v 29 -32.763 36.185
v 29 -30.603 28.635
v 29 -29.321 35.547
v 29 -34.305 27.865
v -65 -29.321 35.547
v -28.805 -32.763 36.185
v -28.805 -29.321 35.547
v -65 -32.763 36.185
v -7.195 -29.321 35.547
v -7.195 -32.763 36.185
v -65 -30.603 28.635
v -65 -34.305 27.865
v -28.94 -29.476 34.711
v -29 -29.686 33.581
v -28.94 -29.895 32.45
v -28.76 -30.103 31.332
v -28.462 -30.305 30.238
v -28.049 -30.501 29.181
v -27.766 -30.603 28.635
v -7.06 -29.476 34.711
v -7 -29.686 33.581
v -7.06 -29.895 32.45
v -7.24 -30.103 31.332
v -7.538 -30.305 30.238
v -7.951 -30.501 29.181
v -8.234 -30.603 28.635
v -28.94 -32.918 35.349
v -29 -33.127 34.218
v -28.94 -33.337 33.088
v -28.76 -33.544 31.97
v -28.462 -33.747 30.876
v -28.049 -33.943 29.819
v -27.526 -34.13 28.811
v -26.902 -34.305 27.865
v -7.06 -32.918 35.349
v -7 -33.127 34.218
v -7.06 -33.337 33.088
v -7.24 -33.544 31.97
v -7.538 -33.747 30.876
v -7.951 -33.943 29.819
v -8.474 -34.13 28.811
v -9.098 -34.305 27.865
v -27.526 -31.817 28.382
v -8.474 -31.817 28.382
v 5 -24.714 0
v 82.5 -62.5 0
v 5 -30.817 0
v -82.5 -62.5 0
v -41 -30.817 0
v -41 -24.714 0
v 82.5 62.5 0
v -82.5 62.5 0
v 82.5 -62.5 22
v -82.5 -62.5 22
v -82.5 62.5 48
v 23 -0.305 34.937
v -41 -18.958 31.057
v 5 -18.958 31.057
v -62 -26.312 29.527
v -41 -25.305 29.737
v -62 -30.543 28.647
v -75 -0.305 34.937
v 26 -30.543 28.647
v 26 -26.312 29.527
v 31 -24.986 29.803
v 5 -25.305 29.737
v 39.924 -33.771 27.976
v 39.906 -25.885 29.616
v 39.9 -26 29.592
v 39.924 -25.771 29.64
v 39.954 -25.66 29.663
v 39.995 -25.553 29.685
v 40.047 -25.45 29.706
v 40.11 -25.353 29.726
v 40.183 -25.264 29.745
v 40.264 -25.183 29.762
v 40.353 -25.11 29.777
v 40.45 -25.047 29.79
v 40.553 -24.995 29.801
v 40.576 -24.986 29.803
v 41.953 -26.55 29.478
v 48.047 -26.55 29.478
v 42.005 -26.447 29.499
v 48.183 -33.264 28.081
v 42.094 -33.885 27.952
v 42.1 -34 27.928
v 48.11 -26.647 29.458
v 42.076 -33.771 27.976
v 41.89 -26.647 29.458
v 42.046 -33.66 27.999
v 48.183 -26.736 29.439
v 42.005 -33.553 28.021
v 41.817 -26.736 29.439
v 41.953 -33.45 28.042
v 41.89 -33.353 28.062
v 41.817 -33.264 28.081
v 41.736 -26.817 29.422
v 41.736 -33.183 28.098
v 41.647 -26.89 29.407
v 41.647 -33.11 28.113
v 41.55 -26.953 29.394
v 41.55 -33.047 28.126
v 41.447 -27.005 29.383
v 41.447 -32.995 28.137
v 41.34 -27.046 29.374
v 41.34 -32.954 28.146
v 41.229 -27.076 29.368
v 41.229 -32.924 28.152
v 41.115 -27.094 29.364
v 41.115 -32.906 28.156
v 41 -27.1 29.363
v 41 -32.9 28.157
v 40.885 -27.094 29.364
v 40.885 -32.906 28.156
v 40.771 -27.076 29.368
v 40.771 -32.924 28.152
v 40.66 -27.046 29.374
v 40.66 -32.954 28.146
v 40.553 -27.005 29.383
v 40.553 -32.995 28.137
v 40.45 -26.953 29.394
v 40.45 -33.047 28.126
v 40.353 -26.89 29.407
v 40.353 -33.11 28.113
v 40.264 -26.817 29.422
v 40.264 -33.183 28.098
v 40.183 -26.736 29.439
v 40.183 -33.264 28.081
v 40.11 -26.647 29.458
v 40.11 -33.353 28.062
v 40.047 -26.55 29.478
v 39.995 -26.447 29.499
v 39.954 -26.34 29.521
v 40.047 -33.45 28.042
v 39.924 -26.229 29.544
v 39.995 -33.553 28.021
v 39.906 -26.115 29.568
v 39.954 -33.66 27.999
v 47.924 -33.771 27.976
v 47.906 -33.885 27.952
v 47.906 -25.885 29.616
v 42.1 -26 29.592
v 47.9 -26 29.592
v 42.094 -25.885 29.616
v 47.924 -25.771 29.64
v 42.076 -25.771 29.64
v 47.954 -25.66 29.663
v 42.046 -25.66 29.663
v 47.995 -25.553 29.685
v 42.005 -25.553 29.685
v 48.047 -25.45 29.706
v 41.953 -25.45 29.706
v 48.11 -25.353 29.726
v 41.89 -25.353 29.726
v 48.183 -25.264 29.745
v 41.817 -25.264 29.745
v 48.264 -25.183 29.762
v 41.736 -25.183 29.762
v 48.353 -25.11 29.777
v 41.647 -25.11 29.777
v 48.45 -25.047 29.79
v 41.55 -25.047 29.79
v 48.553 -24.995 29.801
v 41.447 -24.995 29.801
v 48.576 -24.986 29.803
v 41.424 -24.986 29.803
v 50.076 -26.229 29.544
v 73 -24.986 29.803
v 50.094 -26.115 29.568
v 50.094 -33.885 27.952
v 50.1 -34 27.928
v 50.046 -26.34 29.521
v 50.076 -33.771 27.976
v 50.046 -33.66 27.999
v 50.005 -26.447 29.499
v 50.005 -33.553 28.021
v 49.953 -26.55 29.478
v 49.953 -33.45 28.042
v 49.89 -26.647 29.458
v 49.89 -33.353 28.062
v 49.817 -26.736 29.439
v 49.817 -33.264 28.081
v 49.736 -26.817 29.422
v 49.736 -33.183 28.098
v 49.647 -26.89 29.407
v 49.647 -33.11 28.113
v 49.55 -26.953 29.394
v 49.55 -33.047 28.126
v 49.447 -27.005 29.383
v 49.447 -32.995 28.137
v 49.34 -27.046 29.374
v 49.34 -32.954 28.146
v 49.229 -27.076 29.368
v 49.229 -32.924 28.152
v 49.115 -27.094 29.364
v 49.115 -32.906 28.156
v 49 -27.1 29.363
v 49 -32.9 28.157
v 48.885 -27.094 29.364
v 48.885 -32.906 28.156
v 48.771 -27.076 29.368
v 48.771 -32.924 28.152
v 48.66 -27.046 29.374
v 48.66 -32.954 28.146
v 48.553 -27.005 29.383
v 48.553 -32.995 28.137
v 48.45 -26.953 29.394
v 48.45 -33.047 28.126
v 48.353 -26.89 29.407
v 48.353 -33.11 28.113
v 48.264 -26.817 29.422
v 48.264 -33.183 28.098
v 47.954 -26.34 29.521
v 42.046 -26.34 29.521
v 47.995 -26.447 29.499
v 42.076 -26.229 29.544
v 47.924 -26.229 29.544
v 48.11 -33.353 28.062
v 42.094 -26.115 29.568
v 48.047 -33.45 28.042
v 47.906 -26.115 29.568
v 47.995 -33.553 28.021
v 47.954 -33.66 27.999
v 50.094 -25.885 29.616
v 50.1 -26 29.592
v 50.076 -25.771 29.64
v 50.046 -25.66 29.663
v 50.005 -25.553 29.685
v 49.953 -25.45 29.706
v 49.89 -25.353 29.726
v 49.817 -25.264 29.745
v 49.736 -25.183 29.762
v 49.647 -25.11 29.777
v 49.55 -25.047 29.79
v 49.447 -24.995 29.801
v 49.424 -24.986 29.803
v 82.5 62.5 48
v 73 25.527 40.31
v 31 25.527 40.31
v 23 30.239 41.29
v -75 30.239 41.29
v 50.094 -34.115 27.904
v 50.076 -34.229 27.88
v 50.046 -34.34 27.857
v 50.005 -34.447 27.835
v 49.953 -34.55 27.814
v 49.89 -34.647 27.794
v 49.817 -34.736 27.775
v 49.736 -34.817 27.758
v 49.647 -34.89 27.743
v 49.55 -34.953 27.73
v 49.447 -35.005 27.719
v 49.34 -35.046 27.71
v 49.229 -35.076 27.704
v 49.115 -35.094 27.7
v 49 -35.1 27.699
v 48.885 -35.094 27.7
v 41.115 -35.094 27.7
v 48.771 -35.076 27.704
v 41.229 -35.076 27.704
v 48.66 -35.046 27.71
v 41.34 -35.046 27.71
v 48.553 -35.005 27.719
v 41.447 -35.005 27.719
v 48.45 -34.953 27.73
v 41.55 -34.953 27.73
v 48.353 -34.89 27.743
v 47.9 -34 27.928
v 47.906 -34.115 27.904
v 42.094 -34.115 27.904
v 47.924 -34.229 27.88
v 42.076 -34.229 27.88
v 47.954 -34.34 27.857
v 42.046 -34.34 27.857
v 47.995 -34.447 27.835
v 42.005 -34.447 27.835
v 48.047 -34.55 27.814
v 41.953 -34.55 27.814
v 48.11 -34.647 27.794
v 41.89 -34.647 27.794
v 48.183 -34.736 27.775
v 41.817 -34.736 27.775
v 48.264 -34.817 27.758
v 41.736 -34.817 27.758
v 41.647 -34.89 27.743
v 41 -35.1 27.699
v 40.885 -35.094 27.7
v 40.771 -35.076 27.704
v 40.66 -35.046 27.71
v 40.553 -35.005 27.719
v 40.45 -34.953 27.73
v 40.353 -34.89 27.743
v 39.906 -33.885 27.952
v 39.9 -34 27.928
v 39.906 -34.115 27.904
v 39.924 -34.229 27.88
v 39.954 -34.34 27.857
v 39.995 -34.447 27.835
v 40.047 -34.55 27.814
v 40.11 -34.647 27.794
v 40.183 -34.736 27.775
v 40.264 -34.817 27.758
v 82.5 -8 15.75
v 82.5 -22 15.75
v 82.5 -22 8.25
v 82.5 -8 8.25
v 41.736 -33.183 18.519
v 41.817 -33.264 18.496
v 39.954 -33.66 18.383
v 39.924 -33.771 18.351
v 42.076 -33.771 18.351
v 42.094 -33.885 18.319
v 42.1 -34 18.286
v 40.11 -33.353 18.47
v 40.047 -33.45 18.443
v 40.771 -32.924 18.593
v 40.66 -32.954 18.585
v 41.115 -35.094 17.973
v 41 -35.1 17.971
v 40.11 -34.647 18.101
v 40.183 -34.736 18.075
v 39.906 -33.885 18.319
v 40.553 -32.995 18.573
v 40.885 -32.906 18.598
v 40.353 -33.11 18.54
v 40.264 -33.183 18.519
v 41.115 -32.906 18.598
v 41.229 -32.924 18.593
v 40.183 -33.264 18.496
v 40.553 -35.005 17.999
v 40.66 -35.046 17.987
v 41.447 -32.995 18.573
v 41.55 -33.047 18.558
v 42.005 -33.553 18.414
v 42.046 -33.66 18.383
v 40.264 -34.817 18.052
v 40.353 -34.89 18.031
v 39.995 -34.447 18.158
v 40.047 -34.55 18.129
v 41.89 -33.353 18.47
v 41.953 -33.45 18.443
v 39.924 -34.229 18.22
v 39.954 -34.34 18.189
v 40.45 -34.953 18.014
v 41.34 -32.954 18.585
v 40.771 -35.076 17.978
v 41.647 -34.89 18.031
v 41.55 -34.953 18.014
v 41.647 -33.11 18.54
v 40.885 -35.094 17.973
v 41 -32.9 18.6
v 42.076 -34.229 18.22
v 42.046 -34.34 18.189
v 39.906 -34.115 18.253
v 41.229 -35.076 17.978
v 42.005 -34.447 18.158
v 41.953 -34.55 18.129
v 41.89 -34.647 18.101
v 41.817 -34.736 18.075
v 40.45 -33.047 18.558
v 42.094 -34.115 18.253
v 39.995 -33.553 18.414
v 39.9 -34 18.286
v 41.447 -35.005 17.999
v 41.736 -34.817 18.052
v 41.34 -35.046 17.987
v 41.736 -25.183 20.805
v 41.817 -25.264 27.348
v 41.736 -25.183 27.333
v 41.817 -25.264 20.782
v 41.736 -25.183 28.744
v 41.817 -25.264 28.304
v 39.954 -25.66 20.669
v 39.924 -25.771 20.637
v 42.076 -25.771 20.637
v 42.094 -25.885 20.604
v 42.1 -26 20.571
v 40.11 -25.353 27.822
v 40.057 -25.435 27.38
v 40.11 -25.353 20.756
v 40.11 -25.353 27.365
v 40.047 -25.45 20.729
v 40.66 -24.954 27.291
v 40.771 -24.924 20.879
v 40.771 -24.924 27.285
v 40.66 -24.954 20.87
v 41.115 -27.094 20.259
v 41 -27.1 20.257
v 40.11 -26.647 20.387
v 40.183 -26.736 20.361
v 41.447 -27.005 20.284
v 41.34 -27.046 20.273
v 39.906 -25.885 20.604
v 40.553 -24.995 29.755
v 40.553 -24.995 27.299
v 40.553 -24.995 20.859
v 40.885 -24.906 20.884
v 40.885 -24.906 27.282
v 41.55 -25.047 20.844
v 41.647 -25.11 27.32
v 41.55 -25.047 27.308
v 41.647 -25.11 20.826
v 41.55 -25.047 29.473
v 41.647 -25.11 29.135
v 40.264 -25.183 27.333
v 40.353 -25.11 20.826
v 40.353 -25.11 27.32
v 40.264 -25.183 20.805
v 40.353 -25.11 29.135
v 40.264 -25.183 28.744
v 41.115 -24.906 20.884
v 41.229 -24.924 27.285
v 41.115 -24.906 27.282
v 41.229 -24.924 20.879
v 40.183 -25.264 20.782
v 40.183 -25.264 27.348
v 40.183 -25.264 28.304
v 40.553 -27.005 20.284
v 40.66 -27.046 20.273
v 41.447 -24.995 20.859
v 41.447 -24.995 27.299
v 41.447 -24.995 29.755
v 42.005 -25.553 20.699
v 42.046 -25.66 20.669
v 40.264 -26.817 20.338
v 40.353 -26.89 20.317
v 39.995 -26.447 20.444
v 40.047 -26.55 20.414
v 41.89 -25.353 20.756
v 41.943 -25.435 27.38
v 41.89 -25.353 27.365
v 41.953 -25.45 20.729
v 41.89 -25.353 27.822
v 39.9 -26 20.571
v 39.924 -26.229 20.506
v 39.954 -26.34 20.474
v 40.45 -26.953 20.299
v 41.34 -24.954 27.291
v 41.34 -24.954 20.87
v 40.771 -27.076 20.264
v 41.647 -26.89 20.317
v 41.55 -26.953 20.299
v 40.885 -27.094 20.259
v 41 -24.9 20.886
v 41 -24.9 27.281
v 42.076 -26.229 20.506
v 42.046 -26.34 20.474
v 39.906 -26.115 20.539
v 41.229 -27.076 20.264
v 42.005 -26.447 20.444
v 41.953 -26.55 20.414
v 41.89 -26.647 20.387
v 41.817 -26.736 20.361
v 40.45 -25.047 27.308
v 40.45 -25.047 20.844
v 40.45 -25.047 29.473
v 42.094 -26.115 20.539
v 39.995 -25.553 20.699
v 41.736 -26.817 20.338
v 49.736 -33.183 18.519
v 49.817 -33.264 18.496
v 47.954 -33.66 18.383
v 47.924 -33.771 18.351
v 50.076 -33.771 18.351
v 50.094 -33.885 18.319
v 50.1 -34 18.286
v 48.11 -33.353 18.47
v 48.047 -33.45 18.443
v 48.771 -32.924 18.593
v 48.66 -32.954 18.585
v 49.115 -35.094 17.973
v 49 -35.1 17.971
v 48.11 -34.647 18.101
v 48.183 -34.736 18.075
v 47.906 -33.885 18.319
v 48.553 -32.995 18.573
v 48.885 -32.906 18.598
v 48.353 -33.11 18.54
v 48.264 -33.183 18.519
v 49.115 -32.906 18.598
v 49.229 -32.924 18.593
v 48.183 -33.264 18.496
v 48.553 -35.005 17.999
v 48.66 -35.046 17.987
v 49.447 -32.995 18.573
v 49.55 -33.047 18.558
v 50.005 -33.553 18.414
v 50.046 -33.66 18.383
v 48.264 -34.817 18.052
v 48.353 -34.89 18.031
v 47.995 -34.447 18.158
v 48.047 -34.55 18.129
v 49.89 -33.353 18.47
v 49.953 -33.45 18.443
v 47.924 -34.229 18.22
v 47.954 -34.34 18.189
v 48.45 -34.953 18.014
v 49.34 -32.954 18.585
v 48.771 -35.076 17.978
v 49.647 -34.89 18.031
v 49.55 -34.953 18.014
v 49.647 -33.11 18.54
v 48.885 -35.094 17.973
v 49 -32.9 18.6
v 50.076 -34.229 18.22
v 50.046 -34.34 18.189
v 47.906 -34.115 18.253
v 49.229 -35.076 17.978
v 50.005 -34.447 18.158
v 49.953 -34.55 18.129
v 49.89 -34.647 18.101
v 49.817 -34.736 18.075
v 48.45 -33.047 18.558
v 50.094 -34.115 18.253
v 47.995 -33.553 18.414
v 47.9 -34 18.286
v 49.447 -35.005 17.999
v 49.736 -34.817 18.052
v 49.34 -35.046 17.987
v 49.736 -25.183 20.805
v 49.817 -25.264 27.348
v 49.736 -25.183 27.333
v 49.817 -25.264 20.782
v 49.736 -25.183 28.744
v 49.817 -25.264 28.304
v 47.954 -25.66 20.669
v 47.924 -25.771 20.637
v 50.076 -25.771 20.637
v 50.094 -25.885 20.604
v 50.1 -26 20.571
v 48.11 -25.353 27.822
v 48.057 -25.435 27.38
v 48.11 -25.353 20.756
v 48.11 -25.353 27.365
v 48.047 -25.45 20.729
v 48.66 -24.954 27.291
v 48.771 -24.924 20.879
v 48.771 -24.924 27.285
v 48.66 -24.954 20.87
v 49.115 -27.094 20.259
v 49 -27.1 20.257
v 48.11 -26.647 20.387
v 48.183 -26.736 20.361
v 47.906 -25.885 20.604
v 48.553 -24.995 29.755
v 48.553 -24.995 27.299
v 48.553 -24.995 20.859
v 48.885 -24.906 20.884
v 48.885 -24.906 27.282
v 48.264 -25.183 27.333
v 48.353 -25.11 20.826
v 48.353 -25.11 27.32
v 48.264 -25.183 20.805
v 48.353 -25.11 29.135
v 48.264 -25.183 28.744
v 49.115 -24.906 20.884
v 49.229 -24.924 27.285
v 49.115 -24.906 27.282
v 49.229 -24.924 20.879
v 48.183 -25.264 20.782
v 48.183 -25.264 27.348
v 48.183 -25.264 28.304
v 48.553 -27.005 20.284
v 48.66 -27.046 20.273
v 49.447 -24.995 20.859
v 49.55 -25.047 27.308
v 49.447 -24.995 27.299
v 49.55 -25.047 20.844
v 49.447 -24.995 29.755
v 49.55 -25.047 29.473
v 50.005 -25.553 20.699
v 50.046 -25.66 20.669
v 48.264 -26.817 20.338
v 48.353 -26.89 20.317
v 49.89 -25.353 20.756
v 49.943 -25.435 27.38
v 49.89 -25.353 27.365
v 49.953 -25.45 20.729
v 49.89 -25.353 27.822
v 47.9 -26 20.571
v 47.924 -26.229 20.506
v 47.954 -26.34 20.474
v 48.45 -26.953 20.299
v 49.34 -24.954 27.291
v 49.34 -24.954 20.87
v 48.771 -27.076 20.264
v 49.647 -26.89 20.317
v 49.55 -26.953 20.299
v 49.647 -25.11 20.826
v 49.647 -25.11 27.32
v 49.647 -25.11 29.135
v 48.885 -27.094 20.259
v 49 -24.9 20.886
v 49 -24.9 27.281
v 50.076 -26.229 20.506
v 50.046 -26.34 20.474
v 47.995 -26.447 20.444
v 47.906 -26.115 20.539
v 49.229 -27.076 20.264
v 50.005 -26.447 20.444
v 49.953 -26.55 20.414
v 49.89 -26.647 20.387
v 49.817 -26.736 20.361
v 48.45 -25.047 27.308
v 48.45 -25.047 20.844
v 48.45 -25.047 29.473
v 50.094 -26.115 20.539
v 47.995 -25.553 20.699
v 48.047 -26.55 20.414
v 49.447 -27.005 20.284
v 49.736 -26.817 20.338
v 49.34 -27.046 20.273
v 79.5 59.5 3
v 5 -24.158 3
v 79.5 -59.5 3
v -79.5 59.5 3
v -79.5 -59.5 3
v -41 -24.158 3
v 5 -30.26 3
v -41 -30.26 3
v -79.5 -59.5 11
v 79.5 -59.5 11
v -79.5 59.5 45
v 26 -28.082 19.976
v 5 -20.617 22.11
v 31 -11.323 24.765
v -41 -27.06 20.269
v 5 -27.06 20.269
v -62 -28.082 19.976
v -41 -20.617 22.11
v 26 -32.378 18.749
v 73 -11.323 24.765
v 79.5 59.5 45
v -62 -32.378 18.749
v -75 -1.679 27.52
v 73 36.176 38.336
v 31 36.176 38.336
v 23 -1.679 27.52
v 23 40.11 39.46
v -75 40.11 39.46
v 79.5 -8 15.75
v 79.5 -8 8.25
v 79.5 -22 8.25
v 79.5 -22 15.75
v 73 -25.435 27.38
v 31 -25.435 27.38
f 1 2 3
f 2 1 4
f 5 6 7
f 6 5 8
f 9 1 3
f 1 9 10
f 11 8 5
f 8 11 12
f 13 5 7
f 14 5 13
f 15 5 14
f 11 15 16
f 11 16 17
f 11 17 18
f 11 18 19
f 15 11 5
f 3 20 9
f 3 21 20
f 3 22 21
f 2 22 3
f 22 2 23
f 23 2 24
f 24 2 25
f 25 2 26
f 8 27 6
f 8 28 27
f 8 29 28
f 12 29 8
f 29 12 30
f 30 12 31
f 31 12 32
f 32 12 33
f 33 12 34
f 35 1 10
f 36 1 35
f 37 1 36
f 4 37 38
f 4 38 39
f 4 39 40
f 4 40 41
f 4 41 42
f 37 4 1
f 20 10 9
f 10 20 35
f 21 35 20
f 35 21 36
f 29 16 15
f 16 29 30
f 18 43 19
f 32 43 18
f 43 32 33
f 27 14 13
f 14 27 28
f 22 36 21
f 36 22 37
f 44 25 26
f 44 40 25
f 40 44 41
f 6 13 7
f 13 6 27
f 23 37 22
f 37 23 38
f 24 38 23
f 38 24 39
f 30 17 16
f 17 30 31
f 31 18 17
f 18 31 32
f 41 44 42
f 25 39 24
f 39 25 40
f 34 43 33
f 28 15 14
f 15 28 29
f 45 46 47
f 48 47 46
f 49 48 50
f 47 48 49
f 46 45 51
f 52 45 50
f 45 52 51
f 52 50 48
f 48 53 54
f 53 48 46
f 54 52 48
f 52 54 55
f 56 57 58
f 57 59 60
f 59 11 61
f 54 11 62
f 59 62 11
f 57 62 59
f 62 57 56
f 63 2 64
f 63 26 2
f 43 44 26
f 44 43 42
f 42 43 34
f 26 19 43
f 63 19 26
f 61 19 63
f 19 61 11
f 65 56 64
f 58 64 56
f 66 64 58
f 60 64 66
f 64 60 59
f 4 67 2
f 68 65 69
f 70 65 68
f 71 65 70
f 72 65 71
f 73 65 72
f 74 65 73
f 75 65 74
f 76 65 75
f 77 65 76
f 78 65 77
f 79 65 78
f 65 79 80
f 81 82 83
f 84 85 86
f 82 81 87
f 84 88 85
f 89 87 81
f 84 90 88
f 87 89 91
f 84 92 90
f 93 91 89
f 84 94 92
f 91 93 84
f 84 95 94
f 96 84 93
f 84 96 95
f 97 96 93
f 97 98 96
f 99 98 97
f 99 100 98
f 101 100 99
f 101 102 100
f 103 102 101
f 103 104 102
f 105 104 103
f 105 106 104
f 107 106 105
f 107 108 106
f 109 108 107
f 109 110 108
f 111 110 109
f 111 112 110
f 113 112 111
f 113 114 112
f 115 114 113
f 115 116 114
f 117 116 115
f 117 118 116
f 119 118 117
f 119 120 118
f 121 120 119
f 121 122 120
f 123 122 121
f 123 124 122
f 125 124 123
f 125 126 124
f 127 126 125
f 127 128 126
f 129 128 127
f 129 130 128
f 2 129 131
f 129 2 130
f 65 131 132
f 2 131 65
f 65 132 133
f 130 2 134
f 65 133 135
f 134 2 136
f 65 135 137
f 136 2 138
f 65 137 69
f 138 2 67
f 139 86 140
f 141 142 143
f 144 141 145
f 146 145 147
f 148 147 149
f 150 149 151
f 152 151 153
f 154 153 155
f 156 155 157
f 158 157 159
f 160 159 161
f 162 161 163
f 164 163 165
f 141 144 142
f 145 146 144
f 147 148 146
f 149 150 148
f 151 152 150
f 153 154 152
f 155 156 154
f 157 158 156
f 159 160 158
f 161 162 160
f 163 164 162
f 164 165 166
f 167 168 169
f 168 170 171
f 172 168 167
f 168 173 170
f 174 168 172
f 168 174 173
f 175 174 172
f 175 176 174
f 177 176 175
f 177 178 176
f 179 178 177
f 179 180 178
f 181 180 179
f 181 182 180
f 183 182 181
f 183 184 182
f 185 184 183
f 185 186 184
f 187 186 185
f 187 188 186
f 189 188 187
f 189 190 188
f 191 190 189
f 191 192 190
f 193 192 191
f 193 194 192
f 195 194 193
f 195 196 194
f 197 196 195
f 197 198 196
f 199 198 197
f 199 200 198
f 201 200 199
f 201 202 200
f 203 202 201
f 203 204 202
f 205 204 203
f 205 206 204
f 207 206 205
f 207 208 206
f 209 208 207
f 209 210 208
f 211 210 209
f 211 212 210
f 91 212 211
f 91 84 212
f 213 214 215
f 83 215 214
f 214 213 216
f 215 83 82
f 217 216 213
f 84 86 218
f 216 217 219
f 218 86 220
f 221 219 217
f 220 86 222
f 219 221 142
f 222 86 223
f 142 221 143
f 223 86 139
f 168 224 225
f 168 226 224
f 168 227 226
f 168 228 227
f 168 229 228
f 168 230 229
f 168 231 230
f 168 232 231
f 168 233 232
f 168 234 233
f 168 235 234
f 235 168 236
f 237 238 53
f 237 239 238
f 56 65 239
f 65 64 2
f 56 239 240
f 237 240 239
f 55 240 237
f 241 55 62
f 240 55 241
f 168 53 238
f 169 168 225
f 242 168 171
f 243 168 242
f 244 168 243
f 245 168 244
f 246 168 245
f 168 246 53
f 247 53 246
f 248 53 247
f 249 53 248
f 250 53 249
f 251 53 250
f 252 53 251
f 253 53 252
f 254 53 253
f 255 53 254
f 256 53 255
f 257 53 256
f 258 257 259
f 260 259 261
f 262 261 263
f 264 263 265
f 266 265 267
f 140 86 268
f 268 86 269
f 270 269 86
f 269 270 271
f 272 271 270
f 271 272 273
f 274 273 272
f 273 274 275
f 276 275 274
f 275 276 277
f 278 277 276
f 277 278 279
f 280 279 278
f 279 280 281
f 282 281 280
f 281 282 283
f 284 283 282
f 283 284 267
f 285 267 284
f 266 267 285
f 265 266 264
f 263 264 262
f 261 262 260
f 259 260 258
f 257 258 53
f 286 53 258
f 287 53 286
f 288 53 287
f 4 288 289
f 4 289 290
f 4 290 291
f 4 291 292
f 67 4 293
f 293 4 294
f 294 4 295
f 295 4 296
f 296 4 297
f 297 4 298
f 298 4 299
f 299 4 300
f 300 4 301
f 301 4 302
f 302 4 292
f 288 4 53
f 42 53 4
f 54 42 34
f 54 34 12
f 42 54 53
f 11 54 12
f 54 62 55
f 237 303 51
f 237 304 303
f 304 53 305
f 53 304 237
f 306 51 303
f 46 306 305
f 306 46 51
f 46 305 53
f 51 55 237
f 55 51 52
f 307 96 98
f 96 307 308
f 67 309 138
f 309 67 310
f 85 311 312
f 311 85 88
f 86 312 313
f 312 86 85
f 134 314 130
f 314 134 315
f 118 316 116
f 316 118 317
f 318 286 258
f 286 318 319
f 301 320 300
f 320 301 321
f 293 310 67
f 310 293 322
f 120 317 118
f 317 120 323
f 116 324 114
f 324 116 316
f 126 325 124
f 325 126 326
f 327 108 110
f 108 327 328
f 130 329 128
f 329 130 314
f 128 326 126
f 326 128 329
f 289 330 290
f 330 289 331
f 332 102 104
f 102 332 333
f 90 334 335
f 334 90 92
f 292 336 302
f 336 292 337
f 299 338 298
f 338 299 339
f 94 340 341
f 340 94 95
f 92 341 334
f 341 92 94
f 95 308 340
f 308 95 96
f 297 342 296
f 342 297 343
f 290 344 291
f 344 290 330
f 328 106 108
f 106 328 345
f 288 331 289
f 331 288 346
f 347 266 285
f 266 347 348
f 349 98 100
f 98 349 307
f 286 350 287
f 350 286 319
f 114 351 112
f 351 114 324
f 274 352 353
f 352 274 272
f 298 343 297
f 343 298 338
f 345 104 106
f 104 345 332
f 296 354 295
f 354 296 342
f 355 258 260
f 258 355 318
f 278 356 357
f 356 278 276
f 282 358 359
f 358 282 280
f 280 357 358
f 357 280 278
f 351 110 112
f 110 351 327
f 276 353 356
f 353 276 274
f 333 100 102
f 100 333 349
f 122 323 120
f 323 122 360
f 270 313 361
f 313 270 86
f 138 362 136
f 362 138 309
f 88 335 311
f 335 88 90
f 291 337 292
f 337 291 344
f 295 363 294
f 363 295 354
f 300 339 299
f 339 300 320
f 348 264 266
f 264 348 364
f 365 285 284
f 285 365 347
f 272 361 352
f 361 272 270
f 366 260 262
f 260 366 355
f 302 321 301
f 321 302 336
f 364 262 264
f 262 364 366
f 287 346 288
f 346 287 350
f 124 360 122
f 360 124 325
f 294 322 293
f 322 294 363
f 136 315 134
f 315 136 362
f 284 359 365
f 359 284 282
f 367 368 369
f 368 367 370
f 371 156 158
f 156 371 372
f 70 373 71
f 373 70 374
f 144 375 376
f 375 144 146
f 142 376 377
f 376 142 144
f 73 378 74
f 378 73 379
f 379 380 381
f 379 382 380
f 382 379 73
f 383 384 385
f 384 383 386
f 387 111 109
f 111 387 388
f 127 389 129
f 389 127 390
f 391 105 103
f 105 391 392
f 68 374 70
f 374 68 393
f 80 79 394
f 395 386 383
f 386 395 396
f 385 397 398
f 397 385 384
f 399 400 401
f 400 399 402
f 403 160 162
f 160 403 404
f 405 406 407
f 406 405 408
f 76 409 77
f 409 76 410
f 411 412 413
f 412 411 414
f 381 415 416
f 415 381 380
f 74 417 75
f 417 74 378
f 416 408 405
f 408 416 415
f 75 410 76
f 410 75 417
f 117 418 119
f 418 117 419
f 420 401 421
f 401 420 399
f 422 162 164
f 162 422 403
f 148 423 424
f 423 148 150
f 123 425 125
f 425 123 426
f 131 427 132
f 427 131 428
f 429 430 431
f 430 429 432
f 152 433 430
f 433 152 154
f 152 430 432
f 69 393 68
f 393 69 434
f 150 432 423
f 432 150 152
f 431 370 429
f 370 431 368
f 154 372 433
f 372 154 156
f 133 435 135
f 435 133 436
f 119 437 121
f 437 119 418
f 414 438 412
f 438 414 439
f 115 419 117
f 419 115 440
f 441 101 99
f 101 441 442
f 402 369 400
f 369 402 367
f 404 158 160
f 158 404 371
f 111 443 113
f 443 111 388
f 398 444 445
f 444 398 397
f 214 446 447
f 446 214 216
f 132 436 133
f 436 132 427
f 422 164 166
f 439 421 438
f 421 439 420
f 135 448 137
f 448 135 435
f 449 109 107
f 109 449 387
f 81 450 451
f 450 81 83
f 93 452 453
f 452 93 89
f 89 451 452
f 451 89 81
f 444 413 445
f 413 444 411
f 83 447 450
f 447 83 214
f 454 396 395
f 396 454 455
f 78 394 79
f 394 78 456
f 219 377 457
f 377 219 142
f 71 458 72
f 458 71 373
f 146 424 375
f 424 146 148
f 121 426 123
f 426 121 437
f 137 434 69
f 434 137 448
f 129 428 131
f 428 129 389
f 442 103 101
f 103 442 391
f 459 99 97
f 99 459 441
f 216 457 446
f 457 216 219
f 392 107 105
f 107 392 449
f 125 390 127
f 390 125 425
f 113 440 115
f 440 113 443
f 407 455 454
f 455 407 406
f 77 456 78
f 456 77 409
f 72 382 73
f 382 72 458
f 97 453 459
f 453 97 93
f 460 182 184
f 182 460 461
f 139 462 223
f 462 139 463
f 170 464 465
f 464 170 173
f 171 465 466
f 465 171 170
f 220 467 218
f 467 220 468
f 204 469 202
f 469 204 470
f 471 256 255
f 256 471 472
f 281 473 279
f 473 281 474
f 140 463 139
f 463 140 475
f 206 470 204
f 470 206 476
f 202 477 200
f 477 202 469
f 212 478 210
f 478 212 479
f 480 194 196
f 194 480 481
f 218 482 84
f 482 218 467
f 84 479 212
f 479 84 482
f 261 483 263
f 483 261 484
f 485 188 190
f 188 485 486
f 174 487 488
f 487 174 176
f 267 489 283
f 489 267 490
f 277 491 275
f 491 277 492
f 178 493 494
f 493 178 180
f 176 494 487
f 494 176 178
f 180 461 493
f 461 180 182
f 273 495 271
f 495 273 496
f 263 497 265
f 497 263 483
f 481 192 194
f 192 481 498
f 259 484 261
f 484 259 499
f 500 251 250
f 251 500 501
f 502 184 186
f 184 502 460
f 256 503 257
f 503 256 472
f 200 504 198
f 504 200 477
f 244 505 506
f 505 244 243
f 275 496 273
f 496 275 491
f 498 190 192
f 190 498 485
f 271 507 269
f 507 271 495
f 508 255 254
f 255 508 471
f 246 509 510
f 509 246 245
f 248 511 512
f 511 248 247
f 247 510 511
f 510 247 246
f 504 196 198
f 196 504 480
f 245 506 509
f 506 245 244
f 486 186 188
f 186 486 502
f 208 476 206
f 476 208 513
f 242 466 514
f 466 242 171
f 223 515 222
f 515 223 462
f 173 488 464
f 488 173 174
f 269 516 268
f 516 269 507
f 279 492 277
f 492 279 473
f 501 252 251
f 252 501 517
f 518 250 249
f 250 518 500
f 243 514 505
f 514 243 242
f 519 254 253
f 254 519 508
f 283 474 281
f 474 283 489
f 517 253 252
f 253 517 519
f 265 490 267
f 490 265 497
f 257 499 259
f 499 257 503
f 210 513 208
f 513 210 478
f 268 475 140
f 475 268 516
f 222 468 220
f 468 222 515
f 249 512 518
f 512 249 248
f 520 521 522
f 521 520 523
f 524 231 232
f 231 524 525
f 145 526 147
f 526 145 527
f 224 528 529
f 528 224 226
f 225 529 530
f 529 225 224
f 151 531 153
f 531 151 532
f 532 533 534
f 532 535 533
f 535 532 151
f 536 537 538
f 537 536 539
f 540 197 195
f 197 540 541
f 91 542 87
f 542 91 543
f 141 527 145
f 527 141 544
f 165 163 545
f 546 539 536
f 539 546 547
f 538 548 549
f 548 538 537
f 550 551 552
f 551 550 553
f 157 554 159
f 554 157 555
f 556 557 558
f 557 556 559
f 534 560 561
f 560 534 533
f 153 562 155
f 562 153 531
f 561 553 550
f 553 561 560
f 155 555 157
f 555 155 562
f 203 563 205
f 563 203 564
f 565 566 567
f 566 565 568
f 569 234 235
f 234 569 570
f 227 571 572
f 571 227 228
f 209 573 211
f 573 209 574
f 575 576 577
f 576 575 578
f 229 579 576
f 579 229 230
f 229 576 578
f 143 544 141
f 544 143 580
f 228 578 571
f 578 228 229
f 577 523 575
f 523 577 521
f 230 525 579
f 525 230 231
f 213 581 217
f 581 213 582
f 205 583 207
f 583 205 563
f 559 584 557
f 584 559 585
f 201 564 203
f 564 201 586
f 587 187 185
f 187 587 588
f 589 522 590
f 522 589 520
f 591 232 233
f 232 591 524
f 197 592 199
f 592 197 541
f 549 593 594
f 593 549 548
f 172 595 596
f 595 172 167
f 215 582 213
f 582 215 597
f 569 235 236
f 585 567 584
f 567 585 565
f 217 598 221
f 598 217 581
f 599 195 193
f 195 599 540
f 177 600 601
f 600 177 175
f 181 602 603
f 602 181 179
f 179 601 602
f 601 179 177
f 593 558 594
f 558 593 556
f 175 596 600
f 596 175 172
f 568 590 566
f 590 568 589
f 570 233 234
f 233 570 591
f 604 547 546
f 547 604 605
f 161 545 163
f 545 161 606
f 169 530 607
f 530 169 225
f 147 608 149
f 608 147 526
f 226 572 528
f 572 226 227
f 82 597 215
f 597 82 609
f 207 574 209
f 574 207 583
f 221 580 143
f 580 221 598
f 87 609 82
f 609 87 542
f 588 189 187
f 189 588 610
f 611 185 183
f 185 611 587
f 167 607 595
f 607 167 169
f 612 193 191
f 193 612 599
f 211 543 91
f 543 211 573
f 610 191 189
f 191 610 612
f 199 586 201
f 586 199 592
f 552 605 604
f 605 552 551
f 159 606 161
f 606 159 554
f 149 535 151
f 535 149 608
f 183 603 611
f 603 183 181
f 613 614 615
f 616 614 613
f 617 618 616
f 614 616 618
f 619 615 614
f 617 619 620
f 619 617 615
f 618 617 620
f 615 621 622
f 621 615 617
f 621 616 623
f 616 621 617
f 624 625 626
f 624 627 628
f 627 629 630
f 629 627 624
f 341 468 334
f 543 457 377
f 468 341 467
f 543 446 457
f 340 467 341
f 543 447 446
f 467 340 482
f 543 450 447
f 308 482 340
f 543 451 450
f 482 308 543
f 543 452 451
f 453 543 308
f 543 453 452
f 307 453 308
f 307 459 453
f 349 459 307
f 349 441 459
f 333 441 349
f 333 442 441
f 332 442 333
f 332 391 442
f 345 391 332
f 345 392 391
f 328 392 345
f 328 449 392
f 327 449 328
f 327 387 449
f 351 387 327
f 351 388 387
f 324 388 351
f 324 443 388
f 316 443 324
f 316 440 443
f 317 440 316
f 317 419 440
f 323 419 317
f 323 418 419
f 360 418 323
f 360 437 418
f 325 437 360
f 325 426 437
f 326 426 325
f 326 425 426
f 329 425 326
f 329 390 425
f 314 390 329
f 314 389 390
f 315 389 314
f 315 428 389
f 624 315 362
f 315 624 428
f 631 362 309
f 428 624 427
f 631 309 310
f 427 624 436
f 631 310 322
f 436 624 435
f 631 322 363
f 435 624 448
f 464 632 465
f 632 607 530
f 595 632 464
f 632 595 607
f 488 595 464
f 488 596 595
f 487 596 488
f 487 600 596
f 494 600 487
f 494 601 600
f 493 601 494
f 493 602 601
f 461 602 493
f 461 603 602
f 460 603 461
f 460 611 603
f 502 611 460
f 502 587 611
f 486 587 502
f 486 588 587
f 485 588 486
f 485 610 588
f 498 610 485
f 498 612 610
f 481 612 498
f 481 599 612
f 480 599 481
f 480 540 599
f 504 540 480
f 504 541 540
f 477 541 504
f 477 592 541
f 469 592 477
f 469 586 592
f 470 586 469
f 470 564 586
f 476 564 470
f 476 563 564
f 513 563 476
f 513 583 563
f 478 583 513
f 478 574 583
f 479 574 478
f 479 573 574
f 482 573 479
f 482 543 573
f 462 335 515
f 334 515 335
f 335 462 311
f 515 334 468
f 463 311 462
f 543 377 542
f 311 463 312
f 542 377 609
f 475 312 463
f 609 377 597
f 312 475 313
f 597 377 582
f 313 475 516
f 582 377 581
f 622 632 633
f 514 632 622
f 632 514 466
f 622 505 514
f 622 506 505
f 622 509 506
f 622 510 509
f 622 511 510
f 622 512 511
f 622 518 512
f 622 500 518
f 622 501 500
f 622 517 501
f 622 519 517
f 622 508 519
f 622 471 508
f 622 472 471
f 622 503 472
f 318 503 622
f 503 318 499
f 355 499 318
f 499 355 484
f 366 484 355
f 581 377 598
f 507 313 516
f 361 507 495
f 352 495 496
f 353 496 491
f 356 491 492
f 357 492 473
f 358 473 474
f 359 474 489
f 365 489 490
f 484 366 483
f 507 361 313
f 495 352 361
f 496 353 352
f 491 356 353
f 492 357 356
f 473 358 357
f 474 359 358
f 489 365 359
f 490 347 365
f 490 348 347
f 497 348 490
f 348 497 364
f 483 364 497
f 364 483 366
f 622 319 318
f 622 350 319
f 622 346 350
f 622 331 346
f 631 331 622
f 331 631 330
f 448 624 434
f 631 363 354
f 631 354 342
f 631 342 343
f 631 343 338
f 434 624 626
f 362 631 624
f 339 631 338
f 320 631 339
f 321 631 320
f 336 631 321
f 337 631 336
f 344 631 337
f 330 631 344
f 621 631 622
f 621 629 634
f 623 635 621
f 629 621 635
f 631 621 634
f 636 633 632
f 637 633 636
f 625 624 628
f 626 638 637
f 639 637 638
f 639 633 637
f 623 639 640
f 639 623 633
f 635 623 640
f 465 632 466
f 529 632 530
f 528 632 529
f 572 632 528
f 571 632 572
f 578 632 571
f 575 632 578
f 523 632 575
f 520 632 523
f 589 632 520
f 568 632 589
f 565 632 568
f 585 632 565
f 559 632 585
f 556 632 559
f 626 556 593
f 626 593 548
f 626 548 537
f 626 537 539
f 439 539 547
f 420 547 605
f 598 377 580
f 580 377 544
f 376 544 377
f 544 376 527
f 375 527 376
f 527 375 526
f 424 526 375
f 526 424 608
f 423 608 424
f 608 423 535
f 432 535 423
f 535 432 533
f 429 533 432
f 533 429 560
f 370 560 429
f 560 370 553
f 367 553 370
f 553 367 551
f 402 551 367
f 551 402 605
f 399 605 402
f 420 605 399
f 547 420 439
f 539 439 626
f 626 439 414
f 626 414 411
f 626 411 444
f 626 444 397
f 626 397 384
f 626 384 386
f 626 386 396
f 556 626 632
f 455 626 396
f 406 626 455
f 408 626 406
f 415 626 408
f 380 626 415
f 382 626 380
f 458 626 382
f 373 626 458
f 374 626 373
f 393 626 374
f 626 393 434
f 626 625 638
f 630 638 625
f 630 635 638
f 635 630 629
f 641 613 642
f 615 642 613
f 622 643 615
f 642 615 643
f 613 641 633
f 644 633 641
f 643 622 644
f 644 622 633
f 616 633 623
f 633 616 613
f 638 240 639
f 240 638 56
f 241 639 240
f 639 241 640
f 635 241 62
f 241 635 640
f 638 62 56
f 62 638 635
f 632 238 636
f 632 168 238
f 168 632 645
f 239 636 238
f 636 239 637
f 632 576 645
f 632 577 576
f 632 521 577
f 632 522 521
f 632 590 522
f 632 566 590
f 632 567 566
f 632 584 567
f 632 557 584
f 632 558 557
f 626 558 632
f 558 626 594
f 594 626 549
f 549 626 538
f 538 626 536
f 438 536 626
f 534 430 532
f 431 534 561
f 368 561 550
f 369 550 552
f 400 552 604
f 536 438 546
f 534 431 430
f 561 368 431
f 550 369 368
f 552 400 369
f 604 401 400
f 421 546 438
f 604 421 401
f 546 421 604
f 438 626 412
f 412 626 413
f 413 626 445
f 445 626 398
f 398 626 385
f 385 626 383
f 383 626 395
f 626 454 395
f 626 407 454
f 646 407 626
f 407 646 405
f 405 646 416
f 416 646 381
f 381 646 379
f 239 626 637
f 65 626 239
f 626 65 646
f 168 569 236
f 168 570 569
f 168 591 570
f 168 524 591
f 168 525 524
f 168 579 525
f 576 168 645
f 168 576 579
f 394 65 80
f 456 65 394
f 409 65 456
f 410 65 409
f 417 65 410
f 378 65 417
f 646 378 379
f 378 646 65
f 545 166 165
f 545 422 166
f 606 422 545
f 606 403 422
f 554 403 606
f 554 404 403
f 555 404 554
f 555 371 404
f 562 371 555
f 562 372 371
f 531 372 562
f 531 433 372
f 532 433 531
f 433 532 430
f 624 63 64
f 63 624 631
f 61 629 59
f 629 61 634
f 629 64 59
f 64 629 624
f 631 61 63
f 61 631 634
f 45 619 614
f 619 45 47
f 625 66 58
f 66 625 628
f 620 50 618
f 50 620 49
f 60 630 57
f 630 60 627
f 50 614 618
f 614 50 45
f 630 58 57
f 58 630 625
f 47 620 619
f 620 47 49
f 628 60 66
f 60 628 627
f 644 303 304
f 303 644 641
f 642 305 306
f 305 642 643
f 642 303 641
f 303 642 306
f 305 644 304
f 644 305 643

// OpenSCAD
// ========================================================
// Project Veronica: Tier 1 ESP32 Lectern Desk Pod 
// Application ID: VK26-AU-HCI-0072
// Features: 15-deg Ergonomic Wedge, LCD2004 Bezel, TTP229 Matrix,
//           Closed-Bottom Hotel CR80 Keycard Dock & Hidden PN532 Bay
// ========================================================

$fn = 60;

// Base Dimensions (mm)
pod_l    = 165.0;
pod_w    = 125.0;
front_h  = 22.0;
rear_h   = 48.0;
wall     = 3.0;

// Standard CR80 ID Card Slot Dimensions + Clearances (mm)
card_w   = 88.0;
card_thk = 4.0;

module veronica_desk_pod() {
    difference() {
        union() {
            // 1. OUTER ANGLED WEDGE HULL
            polyhedron(
                points = [
                    [-pod_l/2, -pod_w/2, 0],
                    [ pod_l/2, -pod_w/2, 0],
                    [ pod_l/2,  pod_w/2, 0],
                    [-pod_l/2,  pod_w/2, 0],
                    [-pod_l/2, -pod_w/2, front_h],
                    [ pod_l/2, -pod_w/2, front_h],
                    [ pod_l/2,  pod_w/2, rear_h],
                    [-pod_l/2,  pod_w/2, rear_h]
                ],
                faces = [
                    [0, 1, 2, 3], [4, 5, 1, 0], [7, 6, 5, 4],
                    [5, 6, 2, 1], [6, 7, 3, 2], [7, 4, 0, 3]
                ]
            );

            // 2. FRONT CARD RETENTION LIP (Solid, seamlessly joined with thumb scoop)
            translate([-18, -32.5, front_h + 6.0])
                rotate([-10.5, 0, 0])
                difference() {
                    cube([card_w + 6.0, 3.5, 16.0], center = true);
                    // Ergonomic thumb scoop
                    translate([0, 0, 6.0])
                        rotate([90, 0, 0])
                        cylinder(h = 10, d = 22.0, center = true);
                }
        }

        // 3. INNER ELECTRONICS CAVITY (Kept lower in front so it never punctures card pocket)
        polyhedron(
            points = [
                [-pod_l/2 + wall, -pod_w/2 + wall, wall],
                [ pod_l/2 - wall, -pod_w/2 + wall, wall],
                [ pod_l/2 - wall,  pod_w/2 - wall, wall],
                [-pod_l/2 + wall,  pod_w/2 - wall, wall],
                [-pod_l/2 + wall, -pod_w/2 + wall, front_h - wall - 8.0],
                [ pod_l/2 - wall, -pod_w/2 + wall, front_h - wall - 8.0],
                [ pod_l/2 - wall,  pod_w/2 - wall, rear_h - wall],
                [-pod_l/2 + wall,  pod_w/2 - wall, rear_h - wall]
            ],
            faces = [
                [0, 1, 2, 3], [4, 5, 1, 0], [7, 6, 5, 4],
                [5, 6, 2, 1], [6, 7, 3, 2], [7, 4, 0, 3]
            ]
        );

        // 4. LCD2004 DISPLAY BEZEL WINDOW (Top-Left)
        translate([-26, 20, front_h + 10])
            rotate([-10.5, 0, 0])
            cube([98.0, 41.0, 22.0], center = true);

        // 5. TTP229 CAPACITIVE TOUCH KEYPAD WINDOW (Top-Right)
        translate([52, 10, front_h + 10])
            rotate([-10.5, 0, 0])
            cube([42.0, 68.0, 22.0], center = true);

        // 6. CLOSED-BOTTOM CR80 DROP CHANNEL (Depth = 18mm, completely sealed base)
        translate([-18, -29.0, front_h + 4.0])
            rotate([-10.5, 0, 0])
            cube([card_w, card_thk, 18.0], center = true);

        // 7. HIDDEN INTERNAL PN532 SENSOR POCKET (1.2mm behind card slot)
        translate([-18, -24.8, front_h - 6.0])
            rotate([-10.5, 0, 0])
            cube([46.0, 6.0, 36.0], center = true);

        // 8. STATUS LED APERTURE & ACOUSTIC BUZZER PORTS
        for (dx = [-4, 4], dy = [-4, 4]) {
            translate([45 + dx, -30 + dy, front_h])
                cylinder(h = 18, d = 2.2, center = true);
        }

        // 9. SIDE/REAR USB-C 5V CHARGING PORT CUTOUT
        translate([pod_l/2, -15, 12])
            cube([wall * 4, 14.0, 7.5], center = true);
    }
}

veronica_desk_pod();
